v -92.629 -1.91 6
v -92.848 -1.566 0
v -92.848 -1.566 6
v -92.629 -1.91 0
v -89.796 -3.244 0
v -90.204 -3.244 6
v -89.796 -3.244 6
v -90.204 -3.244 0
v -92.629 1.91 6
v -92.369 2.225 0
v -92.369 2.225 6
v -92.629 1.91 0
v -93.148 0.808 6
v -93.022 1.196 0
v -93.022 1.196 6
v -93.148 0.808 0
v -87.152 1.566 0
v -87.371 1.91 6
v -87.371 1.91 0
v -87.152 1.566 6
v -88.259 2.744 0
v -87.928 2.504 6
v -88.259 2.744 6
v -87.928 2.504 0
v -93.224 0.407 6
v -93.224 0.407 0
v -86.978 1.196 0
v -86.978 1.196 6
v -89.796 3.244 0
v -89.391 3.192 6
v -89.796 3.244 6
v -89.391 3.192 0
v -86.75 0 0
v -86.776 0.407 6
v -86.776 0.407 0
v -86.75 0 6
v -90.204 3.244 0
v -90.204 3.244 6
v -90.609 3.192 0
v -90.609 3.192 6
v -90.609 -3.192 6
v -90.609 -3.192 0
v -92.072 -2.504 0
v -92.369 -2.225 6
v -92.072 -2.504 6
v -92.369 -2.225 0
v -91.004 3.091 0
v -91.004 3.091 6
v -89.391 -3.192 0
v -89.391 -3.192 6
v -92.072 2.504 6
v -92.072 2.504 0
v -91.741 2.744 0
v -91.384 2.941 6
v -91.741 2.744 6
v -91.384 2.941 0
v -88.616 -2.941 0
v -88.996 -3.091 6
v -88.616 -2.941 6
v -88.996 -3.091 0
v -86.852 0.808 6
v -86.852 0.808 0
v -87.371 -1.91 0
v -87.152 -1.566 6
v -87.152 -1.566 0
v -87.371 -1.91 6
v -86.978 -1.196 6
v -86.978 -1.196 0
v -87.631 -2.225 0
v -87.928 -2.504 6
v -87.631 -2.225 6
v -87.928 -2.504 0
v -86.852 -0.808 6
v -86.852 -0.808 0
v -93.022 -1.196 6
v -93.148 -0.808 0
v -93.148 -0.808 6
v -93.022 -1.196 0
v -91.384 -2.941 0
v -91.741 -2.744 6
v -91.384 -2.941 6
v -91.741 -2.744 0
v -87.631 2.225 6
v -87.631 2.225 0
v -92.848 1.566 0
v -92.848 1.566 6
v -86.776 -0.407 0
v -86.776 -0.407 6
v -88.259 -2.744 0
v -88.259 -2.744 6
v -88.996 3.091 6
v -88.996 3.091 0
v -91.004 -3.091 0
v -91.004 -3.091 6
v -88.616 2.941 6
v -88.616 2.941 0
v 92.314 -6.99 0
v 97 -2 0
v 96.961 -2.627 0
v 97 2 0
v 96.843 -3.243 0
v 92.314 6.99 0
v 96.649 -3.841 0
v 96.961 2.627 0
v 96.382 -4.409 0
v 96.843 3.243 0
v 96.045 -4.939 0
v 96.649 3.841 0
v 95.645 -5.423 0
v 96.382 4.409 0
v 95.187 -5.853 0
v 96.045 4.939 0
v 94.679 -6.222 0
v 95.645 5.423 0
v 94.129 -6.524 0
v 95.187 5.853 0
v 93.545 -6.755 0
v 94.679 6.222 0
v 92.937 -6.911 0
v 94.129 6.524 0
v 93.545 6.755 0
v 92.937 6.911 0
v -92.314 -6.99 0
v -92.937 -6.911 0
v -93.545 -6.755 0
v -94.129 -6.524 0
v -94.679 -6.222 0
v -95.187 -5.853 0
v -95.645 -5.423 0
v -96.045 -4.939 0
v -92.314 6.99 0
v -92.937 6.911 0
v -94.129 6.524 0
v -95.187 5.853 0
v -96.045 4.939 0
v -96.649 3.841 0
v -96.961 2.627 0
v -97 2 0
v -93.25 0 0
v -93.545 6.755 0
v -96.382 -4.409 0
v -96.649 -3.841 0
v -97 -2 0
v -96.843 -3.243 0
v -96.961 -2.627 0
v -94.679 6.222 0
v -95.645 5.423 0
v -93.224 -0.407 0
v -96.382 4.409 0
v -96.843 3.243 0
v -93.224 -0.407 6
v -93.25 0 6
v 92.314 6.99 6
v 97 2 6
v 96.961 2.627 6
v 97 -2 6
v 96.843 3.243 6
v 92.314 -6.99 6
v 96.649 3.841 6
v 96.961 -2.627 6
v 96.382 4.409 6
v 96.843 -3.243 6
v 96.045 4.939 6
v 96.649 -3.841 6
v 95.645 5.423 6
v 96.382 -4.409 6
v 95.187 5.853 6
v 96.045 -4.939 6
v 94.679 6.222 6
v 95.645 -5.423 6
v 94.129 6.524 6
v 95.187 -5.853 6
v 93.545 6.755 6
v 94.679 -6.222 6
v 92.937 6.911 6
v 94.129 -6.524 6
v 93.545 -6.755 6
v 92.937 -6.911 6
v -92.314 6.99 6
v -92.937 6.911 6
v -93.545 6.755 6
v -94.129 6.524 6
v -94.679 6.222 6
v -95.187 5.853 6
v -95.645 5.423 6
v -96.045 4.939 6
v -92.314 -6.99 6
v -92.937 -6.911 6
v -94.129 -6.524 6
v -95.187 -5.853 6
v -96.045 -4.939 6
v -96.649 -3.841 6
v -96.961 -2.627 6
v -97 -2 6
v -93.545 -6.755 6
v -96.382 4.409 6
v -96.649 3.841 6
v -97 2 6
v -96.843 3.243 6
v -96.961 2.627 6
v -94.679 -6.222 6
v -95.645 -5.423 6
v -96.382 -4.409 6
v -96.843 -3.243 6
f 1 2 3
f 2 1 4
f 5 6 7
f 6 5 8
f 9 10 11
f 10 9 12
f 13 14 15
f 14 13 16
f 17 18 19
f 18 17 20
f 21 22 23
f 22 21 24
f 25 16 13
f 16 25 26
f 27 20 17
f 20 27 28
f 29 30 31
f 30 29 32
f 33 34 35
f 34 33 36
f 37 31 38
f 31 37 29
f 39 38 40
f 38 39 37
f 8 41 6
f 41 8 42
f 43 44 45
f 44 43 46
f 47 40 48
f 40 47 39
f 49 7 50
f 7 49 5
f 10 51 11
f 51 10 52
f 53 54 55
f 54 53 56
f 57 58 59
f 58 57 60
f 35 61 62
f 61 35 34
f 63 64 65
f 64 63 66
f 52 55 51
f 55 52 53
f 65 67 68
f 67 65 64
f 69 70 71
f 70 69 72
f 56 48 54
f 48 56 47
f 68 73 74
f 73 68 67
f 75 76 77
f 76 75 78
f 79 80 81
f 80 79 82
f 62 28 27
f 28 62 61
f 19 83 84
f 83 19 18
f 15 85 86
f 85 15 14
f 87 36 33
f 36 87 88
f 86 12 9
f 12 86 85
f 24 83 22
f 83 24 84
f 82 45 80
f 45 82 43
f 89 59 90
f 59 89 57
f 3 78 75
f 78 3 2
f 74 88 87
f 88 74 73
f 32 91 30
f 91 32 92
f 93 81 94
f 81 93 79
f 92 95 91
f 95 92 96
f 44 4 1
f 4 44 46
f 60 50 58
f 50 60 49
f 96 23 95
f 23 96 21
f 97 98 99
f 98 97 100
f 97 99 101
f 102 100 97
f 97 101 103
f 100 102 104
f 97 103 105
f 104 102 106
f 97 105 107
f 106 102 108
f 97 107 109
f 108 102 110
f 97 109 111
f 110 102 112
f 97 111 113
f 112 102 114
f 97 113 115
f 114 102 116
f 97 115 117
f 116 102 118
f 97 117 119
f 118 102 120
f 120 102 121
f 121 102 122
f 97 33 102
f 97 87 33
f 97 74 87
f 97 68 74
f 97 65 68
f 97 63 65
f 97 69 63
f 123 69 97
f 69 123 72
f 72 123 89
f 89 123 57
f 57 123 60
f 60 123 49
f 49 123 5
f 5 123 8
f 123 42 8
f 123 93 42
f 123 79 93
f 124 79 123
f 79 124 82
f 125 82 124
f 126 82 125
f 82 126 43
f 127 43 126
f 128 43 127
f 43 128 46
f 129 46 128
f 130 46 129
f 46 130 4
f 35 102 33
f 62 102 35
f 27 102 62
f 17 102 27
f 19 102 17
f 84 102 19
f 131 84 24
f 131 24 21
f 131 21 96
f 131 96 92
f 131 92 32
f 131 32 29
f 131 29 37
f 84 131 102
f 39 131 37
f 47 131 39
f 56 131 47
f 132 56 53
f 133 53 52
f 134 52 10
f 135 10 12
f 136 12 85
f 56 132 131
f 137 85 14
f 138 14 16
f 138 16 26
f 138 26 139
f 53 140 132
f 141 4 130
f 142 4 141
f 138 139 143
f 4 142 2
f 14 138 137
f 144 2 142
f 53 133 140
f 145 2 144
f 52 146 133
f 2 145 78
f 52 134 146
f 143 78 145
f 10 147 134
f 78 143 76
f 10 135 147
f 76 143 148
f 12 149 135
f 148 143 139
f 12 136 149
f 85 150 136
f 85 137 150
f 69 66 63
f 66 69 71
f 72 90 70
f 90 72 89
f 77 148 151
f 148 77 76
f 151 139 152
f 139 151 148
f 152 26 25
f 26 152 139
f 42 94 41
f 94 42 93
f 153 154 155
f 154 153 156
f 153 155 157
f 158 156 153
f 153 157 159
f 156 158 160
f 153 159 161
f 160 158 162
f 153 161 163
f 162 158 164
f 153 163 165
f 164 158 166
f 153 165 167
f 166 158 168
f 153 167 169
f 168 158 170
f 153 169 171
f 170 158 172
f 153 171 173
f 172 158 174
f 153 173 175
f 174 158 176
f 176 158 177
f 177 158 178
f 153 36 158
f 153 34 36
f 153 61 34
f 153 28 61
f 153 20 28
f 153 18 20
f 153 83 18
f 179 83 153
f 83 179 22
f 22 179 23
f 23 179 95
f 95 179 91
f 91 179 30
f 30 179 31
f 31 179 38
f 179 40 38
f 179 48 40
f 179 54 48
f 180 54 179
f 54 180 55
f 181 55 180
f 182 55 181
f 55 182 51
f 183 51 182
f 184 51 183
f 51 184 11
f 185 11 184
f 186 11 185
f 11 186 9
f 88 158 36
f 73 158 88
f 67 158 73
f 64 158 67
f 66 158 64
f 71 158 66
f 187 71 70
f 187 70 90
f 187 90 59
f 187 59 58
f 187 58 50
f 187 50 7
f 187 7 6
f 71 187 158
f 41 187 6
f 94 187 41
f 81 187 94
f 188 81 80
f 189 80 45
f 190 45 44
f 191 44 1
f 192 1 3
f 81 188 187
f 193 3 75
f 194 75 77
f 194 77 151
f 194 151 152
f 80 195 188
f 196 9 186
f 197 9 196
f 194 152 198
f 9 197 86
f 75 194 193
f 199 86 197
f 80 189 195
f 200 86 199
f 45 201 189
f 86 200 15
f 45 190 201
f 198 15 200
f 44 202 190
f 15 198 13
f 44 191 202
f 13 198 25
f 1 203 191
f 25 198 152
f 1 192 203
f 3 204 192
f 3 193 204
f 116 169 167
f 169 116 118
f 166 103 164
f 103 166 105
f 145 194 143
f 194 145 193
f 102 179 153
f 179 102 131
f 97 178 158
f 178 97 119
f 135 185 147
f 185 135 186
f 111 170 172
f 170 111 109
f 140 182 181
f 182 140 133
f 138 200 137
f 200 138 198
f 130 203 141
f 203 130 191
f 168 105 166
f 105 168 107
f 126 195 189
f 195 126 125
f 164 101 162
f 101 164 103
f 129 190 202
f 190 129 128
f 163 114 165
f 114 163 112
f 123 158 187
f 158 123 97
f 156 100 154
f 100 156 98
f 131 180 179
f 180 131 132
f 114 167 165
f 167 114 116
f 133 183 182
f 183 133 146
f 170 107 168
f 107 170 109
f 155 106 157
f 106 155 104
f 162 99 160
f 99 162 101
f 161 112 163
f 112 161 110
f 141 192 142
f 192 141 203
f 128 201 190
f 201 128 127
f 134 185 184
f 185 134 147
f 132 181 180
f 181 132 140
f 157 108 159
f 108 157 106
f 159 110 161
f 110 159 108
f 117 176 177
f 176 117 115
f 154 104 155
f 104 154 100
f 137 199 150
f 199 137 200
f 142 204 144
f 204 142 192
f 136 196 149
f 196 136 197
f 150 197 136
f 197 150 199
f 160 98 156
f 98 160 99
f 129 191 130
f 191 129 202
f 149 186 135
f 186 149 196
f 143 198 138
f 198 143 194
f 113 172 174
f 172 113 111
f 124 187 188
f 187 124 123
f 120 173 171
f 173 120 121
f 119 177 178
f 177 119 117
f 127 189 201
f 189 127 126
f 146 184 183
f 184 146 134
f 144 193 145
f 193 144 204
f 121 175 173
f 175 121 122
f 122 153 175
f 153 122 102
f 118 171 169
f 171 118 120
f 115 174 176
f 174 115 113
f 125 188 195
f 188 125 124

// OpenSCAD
$fn = 50;


difference() {
	union() {
		hull() {
			translate(v = [-92.0000000000, 2.0000000000, 0]) {
				cylinder(h = 6, r = 5);
			}
			translate(v = [92.0000000000, 2.0000000000, 0]) {
				cylinder(h = 6, r = 5);
			}
			translate(v = [-92.0000000000, -2.0000000000, 0]) {
				cylinder(h = 6, r = 5);
			}
			translate(v = [92.0000000000, -2.0000000000, 0]) {
				cylinder(h = 6, r = 5);
			}
		}
	}
	union() {
		translate(v = [-90.0000000000, 0.0000000000, 0]) {
			cylinder(h = 6, r = 3.2500000000);
		}
		translate(v = [-90.0000000000, 0.0000000000, 0]) {
			cylinder(h = 6, r = 1.8000000000);
		}
		translate(v = [-90.0000000000, 0.0000000000, 0]) {
			cylinder(h = 6, r = 1.8000000000);
		}
		translate(v = [-90.0000000000, 0.0000000000, 0]) {
			cylinder(h = 6, r = 1.8000000000);
		}
	}
}
